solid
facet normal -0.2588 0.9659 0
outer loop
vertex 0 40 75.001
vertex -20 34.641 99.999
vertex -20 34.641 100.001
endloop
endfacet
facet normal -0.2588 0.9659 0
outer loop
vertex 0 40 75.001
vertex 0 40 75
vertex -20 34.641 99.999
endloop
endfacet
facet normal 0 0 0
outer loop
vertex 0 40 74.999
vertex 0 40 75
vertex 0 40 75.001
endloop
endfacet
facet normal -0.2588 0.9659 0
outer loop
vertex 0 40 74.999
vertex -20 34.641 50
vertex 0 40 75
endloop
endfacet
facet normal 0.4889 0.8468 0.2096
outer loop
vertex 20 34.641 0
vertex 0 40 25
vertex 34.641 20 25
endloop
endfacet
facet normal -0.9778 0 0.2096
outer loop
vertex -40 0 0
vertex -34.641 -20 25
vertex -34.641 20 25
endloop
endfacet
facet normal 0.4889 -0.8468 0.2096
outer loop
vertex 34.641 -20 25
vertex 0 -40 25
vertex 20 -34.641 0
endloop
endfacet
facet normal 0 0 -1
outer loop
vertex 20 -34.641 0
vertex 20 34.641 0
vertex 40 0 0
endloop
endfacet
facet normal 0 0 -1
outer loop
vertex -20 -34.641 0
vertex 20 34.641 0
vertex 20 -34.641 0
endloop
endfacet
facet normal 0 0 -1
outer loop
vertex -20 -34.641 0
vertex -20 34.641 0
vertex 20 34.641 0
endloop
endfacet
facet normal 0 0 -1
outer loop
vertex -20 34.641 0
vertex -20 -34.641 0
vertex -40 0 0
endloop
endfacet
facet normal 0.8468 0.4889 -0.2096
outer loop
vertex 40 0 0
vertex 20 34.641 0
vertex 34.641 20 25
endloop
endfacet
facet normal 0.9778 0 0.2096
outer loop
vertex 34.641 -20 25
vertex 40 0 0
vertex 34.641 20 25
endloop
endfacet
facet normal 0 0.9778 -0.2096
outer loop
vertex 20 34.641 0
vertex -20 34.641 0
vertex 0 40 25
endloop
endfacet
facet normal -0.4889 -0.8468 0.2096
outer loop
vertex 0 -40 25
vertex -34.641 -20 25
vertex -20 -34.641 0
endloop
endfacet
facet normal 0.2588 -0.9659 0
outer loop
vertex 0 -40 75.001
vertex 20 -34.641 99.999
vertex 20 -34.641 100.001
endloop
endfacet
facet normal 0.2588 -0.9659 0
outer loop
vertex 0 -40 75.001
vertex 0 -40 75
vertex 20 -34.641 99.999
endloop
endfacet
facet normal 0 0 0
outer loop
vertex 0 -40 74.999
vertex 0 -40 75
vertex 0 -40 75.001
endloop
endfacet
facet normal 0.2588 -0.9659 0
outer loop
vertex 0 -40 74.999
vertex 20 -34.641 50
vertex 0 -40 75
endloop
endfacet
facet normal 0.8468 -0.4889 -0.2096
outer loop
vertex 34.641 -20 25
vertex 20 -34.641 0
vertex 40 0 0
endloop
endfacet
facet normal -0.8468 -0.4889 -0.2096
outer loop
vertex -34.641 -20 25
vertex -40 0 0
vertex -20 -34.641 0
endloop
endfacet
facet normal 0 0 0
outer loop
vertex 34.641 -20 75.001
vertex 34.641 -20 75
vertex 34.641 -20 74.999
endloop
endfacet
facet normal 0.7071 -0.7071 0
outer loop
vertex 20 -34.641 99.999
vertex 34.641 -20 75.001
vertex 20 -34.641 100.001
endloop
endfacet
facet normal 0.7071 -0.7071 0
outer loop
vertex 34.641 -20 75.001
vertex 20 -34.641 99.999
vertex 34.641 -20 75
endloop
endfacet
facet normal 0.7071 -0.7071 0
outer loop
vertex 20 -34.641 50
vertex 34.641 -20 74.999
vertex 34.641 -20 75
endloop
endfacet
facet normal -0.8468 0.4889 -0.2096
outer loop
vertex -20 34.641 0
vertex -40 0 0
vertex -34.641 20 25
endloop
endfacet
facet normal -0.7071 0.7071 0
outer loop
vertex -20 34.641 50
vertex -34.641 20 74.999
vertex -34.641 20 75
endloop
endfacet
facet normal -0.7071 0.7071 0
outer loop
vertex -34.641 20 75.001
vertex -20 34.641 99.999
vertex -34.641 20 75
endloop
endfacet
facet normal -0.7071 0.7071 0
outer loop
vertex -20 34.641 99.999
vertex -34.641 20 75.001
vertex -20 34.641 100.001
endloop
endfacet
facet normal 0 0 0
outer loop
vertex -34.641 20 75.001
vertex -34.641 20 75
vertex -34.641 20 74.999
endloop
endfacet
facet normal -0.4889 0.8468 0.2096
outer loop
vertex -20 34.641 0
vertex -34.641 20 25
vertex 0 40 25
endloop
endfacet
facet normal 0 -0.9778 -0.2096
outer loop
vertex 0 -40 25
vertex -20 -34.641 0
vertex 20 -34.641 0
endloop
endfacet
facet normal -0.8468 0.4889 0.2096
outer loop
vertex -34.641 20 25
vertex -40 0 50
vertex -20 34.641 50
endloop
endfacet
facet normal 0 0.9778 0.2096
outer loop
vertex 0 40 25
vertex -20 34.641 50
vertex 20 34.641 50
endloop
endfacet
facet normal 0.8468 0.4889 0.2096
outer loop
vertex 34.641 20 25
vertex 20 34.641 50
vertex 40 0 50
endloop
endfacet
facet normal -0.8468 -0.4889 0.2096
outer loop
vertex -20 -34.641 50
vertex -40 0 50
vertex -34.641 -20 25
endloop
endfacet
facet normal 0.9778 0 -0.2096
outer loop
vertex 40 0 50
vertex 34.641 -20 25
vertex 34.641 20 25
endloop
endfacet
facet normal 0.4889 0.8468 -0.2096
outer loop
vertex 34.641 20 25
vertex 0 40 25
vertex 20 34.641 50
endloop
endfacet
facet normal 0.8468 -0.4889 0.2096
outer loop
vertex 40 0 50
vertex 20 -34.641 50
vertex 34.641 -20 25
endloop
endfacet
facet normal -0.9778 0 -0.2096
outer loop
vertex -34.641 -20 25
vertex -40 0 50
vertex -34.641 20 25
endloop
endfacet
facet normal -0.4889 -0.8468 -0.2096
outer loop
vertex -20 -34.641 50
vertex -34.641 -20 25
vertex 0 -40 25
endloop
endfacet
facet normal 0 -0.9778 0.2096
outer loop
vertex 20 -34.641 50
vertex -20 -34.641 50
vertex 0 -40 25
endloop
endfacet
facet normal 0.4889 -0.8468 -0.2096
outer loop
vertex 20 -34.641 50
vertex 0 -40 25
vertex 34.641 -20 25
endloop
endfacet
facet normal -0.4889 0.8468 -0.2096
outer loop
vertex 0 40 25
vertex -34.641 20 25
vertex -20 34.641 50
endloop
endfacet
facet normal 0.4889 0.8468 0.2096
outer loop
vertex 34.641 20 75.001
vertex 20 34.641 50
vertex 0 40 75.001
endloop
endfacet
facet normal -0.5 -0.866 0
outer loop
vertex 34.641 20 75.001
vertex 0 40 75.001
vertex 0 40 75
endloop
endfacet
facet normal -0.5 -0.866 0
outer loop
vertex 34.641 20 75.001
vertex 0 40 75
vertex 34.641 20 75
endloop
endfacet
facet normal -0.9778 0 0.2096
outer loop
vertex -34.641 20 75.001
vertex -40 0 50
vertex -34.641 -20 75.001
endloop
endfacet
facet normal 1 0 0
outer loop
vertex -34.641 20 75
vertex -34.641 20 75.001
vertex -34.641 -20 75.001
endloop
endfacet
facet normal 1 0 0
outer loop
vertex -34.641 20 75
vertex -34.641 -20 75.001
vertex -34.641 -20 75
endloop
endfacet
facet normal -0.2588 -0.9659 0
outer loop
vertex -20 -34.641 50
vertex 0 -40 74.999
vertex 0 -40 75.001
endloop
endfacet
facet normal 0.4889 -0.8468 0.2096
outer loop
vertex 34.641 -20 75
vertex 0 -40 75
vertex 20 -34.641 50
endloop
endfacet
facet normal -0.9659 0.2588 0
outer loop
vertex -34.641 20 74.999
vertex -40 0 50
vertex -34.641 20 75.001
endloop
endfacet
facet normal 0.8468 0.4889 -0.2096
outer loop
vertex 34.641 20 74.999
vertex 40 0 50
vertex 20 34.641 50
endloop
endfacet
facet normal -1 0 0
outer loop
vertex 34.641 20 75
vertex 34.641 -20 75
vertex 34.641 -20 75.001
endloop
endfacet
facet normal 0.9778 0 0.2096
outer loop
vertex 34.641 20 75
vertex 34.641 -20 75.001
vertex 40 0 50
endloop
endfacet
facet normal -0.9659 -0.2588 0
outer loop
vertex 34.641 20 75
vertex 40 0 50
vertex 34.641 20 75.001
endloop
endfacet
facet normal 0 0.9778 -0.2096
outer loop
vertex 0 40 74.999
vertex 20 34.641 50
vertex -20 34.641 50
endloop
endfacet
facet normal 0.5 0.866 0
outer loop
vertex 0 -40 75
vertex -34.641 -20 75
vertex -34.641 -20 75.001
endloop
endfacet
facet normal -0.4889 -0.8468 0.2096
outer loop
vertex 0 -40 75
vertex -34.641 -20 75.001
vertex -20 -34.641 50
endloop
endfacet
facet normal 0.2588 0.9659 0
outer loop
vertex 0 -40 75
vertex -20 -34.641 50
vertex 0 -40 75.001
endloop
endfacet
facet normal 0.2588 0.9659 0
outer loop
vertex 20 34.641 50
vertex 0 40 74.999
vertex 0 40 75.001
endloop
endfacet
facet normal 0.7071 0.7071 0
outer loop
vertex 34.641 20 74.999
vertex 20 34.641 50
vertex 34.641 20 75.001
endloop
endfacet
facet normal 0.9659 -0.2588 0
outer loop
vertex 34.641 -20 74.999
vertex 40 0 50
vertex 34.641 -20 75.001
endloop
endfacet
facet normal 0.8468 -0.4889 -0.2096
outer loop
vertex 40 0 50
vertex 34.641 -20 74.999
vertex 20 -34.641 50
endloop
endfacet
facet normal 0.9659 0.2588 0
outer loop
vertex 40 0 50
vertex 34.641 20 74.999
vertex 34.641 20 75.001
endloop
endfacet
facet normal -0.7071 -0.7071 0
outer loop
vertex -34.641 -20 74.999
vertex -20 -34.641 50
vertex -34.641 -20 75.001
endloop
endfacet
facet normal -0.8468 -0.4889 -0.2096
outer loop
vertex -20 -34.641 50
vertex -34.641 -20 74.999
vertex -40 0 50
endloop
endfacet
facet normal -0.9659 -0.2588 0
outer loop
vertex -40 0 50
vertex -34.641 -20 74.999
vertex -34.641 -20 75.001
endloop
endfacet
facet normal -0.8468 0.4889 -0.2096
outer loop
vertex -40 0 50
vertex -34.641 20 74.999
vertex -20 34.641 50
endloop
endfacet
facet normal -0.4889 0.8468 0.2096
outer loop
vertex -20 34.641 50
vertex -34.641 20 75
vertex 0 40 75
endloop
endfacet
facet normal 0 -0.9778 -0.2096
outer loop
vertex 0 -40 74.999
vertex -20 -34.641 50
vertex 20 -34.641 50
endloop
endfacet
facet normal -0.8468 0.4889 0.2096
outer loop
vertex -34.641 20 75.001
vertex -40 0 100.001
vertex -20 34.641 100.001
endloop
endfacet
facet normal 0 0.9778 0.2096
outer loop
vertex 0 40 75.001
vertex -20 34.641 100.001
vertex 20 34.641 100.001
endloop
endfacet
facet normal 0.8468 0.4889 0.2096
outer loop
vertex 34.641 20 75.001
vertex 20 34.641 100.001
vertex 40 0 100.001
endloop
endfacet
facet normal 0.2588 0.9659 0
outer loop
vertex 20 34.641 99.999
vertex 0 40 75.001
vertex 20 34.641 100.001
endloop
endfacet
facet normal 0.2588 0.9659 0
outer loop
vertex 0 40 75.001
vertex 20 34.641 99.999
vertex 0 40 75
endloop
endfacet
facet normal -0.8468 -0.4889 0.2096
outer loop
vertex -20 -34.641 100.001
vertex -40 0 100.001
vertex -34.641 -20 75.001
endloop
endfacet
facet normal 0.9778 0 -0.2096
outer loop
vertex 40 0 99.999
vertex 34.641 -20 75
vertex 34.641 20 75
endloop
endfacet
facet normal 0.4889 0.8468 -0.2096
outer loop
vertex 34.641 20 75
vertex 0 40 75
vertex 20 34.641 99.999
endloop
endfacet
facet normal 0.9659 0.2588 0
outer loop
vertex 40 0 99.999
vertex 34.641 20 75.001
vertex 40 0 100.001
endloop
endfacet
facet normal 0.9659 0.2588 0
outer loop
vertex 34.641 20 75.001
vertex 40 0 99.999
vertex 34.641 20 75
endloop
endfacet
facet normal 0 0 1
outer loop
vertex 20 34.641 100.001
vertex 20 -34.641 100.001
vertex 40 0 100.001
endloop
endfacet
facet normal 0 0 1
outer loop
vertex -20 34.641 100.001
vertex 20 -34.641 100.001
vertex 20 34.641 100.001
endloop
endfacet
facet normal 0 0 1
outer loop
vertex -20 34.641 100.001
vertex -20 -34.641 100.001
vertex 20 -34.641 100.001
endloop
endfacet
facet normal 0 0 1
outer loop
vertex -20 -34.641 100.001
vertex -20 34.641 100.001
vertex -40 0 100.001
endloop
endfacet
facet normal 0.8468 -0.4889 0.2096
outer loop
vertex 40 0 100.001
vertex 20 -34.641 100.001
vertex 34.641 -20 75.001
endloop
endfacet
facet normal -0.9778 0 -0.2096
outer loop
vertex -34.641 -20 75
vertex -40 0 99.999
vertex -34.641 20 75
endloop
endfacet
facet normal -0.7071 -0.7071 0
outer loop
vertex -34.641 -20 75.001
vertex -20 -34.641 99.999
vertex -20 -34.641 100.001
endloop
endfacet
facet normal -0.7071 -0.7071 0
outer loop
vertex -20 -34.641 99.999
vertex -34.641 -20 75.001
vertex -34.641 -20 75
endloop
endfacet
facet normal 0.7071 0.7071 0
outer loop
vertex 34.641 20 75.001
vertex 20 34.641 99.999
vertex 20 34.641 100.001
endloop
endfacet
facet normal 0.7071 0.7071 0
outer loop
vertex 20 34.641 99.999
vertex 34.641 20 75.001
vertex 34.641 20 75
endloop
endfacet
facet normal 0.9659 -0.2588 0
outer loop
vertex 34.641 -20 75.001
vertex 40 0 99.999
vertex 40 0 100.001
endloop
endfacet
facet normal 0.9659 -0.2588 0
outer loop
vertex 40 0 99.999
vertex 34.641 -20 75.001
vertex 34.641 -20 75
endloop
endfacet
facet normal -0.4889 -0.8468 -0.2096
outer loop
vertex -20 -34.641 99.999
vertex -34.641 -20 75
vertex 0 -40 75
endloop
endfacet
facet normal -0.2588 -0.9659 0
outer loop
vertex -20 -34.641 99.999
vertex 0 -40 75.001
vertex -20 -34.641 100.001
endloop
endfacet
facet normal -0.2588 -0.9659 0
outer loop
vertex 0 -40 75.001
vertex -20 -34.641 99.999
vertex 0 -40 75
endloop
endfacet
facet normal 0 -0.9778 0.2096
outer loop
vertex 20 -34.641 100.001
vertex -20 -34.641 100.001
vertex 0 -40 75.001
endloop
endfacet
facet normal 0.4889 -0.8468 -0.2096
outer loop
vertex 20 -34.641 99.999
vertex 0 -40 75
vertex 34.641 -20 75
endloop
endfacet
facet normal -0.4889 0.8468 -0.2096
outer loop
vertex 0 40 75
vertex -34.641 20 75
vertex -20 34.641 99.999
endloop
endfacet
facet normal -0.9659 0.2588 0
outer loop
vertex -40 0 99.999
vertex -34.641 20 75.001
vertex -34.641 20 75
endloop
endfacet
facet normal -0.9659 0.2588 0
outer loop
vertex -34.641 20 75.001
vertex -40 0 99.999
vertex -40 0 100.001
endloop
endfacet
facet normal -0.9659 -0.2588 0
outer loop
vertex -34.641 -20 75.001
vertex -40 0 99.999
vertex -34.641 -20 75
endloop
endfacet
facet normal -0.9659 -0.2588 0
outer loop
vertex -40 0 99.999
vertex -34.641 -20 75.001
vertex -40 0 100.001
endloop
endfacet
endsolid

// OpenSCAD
$fn = 6;


mike();



module mike()
{
section();
rotate([0, 0, 30]) translate([0, 0, s_height]) section();
translate([0, 0, s_height*2]) section();
rotate([0, 0, 30]) translate([0, 0, s_height*3]) section();
}


s_radius = 40;
s_height = 25;



module section()
{
	hull()
	{
		cylinder(h=0.001, r1=s_radius,r2=s_radius, center=true);
		rotate([0, 0, 30]) translate([0, 0, s_height]) cylinder(h=0.001, r1=s_radius,r2=s_radius, center=true);
	}
}


/*
difference() {
mike();
translate([0, 0, 2]) scale([0.90, 0.9, 1]) mike();

translate([0, 0, 20]) cube([100, 100, 1], center=true);

}


module mike()
{
bob();
rotate([0, 0, 30]) translate([0, 0, 5]) bob();
translate([0, 0, 10]) bob();
rotate([0, 0, 30]) translate([0, 0, 15]) bob();
}


module bob()
{
hull() {
cylinder(h=0.001, r1=10,r2=10, center=true);




rotate([0, 0, 30]) translate([0, 0, 5]) cylinder(h=0.001, r1=10,r2=10, center=true);
}


}
*/
